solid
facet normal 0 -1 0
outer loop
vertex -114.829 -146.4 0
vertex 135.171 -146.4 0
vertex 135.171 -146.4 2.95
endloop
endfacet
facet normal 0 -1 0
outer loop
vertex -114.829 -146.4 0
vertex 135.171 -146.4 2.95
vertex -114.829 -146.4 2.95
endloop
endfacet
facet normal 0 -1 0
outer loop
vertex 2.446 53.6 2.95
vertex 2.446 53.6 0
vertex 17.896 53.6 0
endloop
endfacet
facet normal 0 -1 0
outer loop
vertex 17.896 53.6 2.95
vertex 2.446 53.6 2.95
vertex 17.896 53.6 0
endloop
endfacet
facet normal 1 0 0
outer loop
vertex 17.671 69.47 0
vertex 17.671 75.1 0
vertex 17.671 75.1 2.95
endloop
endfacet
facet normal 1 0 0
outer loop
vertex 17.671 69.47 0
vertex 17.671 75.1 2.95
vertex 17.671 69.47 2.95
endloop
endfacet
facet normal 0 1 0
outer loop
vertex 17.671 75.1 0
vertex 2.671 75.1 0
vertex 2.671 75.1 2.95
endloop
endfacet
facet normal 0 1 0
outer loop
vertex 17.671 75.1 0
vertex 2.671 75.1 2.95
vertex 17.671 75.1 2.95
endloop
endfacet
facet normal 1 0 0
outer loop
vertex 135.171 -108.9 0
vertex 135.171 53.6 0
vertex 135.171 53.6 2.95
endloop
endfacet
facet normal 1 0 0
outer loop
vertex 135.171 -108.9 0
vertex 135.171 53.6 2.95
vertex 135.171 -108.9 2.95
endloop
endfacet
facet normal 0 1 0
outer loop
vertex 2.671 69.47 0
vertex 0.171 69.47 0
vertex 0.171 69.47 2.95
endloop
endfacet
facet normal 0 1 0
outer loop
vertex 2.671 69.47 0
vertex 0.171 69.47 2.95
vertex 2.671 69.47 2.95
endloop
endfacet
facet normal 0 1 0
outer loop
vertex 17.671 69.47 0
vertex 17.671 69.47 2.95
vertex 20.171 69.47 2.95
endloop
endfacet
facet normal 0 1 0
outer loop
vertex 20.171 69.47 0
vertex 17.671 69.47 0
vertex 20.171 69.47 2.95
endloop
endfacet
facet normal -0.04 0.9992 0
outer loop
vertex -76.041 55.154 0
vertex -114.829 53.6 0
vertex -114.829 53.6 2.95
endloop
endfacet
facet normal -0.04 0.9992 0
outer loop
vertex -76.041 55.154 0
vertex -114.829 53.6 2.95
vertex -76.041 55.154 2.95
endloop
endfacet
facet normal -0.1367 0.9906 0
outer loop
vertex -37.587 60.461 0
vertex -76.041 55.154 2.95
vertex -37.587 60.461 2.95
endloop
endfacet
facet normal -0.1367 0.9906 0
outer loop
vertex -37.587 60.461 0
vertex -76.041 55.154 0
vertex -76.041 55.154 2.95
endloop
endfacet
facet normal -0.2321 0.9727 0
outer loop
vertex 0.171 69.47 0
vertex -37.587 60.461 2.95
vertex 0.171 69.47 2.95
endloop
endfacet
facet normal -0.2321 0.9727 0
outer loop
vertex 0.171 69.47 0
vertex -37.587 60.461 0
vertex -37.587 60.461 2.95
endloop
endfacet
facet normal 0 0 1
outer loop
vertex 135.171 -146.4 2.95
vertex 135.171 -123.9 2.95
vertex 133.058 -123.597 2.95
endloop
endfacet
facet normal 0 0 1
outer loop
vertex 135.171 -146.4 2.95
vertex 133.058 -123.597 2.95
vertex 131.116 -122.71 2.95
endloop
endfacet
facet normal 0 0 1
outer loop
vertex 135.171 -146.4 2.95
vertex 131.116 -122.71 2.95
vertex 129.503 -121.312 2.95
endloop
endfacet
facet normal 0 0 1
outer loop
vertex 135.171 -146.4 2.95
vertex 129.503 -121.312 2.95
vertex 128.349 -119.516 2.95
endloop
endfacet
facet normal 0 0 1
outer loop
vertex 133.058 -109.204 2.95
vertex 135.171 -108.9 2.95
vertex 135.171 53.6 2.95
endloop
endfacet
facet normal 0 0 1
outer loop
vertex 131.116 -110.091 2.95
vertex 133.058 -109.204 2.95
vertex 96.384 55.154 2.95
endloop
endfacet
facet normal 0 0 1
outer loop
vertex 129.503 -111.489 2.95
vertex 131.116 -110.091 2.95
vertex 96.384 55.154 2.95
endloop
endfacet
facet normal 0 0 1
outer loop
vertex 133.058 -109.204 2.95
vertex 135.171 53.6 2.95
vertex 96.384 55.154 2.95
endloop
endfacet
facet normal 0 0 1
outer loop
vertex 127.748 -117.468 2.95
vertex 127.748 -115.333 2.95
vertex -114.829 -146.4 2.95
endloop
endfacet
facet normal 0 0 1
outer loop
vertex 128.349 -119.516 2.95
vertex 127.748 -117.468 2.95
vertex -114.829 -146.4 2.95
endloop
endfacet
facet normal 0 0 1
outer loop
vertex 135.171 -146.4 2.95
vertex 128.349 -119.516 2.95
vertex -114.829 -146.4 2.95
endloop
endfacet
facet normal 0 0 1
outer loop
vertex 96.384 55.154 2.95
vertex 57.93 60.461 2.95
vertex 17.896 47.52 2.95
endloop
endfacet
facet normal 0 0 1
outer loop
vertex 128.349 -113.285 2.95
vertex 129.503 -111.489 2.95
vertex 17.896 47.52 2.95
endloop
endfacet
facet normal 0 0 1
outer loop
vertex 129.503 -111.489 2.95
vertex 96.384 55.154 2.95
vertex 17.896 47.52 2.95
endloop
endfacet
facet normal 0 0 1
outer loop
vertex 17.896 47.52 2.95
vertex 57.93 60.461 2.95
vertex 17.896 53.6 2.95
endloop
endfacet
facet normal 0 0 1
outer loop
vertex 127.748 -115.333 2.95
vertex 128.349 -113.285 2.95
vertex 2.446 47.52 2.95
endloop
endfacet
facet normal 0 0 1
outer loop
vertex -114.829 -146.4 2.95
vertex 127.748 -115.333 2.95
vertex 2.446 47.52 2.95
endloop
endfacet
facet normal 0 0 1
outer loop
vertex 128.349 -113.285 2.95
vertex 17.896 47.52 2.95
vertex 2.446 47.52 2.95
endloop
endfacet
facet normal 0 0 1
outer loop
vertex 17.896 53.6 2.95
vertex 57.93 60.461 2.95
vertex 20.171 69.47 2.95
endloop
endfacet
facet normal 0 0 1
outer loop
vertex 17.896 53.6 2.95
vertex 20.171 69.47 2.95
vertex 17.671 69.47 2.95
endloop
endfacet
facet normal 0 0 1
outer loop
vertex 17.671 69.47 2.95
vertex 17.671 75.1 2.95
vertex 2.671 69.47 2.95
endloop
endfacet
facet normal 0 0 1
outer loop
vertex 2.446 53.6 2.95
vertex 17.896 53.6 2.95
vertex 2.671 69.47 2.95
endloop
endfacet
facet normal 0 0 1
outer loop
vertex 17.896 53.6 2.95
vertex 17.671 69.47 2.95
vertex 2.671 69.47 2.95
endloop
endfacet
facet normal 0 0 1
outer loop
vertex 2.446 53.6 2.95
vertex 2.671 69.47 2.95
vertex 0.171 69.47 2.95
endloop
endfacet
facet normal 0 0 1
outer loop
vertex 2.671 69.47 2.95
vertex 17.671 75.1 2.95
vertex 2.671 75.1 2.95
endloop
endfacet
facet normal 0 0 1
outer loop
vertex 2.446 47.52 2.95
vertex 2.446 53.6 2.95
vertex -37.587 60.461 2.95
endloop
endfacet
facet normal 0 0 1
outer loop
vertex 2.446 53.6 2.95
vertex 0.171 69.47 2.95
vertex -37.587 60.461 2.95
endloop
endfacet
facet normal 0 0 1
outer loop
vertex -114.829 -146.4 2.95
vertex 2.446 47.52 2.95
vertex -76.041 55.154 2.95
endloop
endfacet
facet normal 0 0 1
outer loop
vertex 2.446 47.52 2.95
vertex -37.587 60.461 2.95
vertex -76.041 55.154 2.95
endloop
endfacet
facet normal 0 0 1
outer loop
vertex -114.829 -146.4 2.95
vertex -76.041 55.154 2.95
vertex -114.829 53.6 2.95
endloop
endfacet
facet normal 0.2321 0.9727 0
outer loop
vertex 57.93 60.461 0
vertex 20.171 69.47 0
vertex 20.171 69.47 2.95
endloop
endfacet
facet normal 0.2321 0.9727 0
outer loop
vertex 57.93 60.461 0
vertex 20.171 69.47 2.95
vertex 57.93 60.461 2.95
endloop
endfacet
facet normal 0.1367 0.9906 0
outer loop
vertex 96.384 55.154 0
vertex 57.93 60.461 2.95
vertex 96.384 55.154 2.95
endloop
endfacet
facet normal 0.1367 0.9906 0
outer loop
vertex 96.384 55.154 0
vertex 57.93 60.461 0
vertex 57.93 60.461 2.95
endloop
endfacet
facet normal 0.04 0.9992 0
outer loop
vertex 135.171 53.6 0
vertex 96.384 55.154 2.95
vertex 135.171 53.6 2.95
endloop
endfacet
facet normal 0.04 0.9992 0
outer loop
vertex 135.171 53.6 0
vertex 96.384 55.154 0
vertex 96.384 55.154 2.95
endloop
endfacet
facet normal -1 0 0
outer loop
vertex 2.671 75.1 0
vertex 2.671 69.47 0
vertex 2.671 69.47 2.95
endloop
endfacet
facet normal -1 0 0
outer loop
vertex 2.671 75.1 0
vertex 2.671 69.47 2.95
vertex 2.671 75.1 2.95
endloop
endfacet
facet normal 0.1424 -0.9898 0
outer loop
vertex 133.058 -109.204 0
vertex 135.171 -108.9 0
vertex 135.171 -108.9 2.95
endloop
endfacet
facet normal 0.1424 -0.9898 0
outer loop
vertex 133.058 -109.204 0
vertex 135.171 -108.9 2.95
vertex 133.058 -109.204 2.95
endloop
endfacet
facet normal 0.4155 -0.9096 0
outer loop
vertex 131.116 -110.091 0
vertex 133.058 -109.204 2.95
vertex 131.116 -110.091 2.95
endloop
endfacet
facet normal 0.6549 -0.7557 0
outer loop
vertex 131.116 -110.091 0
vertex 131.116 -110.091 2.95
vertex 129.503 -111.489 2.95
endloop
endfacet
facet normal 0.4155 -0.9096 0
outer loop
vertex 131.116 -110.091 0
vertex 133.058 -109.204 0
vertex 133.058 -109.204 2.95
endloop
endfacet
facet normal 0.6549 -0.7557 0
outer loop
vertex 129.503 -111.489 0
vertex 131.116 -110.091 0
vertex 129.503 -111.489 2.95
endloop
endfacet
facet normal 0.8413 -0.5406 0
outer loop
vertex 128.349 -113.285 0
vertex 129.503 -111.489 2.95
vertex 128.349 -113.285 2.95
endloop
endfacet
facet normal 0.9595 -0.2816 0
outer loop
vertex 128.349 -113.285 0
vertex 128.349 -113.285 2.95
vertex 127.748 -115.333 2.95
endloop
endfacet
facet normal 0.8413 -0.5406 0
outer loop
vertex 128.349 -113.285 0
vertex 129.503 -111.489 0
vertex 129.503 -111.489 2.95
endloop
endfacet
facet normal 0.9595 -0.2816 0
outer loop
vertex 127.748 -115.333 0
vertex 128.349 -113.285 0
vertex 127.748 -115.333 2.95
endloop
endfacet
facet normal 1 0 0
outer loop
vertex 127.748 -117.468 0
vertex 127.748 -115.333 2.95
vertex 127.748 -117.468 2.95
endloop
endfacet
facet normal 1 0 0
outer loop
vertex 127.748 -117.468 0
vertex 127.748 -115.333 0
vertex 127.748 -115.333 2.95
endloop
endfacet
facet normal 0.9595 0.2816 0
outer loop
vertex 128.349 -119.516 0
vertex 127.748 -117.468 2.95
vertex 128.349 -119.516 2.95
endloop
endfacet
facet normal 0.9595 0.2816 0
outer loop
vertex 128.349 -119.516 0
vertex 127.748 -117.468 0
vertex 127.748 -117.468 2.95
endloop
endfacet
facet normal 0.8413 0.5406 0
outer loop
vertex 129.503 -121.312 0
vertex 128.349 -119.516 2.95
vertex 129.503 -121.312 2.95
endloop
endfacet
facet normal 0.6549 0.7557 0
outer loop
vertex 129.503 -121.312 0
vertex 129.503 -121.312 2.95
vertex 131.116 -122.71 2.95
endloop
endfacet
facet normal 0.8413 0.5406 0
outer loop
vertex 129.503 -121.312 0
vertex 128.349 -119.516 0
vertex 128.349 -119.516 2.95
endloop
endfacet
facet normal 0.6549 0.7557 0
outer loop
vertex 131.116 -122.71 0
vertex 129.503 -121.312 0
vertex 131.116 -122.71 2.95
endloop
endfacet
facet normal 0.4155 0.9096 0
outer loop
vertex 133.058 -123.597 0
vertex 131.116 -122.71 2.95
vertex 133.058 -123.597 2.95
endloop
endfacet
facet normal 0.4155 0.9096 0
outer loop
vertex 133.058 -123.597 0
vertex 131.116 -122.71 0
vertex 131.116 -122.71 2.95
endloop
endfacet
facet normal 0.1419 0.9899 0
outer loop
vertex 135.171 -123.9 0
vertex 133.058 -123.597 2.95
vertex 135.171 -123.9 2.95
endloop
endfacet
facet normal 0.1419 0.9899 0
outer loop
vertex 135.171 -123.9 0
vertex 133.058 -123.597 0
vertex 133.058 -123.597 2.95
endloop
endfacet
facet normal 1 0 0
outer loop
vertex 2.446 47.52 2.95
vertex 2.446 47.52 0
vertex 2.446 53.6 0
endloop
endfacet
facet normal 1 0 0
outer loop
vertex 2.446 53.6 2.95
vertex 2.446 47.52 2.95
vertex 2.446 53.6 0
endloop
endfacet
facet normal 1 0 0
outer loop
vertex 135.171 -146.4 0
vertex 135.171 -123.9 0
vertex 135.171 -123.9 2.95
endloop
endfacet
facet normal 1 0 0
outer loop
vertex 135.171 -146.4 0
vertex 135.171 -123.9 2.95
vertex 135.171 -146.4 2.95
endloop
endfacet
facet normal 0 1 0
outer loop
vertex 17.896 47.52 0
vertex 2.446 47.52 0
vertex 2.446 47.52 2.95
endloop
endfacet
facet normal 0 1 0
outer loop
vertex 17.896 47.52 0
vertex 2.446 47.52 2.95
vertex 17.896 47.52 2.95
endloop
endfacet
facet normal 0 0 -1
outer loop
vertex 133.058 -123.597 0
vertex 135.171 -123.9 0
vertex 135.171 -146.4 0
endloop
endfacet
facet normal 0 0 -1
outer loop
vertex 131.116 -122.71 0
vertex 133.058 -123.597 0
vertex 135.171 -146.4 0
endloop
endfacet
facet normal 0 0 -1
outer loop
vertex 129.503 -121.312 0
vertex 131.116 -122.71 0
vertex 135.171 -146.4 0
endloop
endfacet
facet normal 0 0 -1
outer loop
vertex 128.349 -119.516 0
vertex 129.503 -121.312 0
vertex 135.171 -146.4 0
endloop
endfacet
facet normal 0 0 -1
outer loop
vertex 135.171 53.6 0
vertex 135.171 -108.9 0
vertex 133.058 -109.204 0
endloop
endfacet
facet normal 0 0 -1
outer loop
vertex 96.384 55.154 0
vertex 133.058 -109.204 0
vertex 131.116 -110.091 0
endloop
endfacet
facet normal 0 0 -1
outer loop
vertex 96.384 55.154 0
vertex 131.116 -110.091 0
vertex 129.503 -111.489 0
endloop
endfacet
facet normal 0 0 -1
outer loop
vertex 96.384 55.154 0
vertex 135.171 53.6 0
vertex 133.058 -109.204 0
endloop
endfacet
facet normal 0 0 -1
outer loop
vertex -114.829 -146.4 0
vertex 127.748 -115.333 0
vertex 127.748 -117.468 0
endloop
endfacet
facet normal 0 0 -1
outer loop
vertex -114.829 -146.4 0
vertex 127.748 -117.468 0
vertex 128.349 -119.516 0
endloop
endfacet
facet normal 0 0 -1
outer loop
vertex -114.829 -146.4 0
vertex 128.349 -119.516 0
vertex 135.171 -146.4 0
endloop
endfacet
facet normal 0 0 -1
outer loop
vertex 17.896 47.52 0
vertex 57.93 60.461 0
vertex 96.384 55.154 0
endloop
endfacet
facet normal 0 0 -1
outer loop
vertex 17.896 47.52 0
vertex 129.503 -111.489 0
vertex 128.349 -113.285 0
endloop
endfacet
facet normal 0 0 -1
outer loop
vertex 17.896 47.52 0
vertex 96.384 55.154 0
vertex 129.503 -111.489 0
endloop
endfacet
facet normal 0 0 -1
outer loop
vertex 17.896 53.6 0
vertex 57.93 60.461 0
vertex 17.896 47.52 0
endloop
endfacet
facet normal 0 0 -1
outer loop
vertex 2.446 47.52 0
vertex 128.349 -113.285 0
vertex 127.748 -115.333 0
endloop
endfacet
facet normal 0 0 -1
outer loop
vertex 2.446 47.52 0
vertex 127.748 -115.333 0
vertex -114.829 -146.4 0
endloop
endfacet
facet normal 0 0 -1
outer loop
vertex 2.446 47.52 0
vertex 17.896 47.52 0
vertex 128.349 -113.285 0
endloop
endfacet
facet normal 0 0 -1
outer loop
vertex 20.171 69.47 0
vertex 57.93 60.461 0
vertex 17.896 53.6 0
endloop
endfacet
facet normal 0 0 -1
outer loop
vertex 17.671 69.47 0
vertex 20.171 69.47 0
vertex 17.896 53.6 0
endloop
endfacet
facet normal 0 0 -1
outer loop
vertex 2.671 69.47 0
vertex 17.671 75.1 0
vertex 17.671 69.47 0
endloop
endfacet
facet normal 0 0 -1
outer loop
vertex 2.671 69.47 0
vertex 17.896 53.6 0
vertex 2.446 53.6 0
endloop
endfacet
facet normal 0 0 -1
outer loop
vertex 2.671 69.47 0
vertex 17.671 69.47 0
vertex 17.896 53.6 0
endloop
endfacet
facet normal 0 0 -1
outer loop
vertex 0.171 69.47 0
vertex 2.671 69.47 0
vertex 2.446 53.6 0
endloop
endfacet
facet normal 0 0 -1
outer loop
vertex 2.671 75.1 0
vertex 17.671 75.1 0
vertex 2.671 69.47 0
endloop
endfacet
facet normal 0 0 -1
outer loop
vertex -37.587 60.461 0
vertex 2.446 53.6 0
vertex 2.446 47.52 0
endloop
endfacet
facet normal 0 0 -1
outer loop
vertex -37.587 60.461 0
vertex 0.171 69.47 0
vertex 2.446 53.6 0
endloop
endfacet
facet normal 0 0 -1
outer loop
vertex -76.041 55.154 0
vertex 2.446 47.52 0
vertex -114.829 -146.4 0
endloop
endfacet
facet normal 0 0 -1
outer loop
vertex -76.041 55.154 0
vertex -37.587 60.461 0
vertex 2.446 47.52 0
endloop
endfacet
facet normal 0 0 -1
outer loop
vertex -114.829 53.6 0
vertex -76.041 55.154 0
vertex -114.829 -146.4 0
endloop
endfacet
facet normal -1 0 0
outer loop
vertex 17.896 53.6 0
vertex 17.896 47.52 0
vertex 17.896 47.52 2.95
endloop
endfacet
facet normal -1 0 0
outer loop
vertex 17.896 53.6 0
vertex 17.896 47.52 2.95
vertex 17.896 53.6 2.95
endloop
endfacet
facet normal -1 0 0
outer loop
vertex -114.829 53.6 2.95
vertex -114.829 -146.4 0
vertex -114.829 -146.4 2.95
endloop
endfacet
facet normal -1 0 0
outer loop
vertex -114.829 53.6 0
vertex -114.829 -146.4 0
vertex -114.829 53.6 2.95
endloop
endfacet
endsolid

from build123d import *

# Parameters (mm, degrees)
SKETCH1_W           = 15.45
SKETCH1_H           = 6.08
BOSS_EXTRUDE1_DEPTH = 2.95


with BuildPart() as part:
    # Sketch1 → Boss-Extrude1 (new body)
    with BuildSketch(Plane.XY):
        with BuildLine():
            Line((0.171167624, 69.469671818), (2.671167624, 69.469671818))
            Line((2.671167624, 69.469671818), (2.671167624, 75.099671818))
            Line((2.671167624, 75.099671818), (17.671167624, 75.099671818))
            Line((17.671167624, 75.099671818), (17.671167624, 69.469671818))
            Line((17.671167624, 69.469671818), (20.171167624, 69.469671818))
            ThreePointArc((20.171167624, 69.469671818), (77.092371221, 57.340494982), (135.171167624, 53.599671818))
            Line((135.171167624, 53.599671818), (135.171167624, -108.900328182))
            ThreePointArc((135.171167624, -108.900328182), (127.671167624, -116.400328182), (135.171167624, -123.900328182))
            Line((135.171167624, -123.900328182), (135.171167624, -146.400328182))
            Line((135.171167624, -146.400328182), (-114.828832376, -146.400328182))
            Line((-114.828832376, -146.400328182), (-114.828832376, 53.599671818))
            ThreePointArc((-114.828832376, 53.599671818), (-56.750035973, 57.340494982), (0.171167624, 69.469671818))
        make_face()
        with Locations((10.171167624, 50.559671818)):
            Rectangle(SKETCH1_W, SKETCH1_H, mode=Mode.SUBTRACT)
    extrude(amount=BOSS_EXTRUDE1_DEPTH)


solid = part.part
